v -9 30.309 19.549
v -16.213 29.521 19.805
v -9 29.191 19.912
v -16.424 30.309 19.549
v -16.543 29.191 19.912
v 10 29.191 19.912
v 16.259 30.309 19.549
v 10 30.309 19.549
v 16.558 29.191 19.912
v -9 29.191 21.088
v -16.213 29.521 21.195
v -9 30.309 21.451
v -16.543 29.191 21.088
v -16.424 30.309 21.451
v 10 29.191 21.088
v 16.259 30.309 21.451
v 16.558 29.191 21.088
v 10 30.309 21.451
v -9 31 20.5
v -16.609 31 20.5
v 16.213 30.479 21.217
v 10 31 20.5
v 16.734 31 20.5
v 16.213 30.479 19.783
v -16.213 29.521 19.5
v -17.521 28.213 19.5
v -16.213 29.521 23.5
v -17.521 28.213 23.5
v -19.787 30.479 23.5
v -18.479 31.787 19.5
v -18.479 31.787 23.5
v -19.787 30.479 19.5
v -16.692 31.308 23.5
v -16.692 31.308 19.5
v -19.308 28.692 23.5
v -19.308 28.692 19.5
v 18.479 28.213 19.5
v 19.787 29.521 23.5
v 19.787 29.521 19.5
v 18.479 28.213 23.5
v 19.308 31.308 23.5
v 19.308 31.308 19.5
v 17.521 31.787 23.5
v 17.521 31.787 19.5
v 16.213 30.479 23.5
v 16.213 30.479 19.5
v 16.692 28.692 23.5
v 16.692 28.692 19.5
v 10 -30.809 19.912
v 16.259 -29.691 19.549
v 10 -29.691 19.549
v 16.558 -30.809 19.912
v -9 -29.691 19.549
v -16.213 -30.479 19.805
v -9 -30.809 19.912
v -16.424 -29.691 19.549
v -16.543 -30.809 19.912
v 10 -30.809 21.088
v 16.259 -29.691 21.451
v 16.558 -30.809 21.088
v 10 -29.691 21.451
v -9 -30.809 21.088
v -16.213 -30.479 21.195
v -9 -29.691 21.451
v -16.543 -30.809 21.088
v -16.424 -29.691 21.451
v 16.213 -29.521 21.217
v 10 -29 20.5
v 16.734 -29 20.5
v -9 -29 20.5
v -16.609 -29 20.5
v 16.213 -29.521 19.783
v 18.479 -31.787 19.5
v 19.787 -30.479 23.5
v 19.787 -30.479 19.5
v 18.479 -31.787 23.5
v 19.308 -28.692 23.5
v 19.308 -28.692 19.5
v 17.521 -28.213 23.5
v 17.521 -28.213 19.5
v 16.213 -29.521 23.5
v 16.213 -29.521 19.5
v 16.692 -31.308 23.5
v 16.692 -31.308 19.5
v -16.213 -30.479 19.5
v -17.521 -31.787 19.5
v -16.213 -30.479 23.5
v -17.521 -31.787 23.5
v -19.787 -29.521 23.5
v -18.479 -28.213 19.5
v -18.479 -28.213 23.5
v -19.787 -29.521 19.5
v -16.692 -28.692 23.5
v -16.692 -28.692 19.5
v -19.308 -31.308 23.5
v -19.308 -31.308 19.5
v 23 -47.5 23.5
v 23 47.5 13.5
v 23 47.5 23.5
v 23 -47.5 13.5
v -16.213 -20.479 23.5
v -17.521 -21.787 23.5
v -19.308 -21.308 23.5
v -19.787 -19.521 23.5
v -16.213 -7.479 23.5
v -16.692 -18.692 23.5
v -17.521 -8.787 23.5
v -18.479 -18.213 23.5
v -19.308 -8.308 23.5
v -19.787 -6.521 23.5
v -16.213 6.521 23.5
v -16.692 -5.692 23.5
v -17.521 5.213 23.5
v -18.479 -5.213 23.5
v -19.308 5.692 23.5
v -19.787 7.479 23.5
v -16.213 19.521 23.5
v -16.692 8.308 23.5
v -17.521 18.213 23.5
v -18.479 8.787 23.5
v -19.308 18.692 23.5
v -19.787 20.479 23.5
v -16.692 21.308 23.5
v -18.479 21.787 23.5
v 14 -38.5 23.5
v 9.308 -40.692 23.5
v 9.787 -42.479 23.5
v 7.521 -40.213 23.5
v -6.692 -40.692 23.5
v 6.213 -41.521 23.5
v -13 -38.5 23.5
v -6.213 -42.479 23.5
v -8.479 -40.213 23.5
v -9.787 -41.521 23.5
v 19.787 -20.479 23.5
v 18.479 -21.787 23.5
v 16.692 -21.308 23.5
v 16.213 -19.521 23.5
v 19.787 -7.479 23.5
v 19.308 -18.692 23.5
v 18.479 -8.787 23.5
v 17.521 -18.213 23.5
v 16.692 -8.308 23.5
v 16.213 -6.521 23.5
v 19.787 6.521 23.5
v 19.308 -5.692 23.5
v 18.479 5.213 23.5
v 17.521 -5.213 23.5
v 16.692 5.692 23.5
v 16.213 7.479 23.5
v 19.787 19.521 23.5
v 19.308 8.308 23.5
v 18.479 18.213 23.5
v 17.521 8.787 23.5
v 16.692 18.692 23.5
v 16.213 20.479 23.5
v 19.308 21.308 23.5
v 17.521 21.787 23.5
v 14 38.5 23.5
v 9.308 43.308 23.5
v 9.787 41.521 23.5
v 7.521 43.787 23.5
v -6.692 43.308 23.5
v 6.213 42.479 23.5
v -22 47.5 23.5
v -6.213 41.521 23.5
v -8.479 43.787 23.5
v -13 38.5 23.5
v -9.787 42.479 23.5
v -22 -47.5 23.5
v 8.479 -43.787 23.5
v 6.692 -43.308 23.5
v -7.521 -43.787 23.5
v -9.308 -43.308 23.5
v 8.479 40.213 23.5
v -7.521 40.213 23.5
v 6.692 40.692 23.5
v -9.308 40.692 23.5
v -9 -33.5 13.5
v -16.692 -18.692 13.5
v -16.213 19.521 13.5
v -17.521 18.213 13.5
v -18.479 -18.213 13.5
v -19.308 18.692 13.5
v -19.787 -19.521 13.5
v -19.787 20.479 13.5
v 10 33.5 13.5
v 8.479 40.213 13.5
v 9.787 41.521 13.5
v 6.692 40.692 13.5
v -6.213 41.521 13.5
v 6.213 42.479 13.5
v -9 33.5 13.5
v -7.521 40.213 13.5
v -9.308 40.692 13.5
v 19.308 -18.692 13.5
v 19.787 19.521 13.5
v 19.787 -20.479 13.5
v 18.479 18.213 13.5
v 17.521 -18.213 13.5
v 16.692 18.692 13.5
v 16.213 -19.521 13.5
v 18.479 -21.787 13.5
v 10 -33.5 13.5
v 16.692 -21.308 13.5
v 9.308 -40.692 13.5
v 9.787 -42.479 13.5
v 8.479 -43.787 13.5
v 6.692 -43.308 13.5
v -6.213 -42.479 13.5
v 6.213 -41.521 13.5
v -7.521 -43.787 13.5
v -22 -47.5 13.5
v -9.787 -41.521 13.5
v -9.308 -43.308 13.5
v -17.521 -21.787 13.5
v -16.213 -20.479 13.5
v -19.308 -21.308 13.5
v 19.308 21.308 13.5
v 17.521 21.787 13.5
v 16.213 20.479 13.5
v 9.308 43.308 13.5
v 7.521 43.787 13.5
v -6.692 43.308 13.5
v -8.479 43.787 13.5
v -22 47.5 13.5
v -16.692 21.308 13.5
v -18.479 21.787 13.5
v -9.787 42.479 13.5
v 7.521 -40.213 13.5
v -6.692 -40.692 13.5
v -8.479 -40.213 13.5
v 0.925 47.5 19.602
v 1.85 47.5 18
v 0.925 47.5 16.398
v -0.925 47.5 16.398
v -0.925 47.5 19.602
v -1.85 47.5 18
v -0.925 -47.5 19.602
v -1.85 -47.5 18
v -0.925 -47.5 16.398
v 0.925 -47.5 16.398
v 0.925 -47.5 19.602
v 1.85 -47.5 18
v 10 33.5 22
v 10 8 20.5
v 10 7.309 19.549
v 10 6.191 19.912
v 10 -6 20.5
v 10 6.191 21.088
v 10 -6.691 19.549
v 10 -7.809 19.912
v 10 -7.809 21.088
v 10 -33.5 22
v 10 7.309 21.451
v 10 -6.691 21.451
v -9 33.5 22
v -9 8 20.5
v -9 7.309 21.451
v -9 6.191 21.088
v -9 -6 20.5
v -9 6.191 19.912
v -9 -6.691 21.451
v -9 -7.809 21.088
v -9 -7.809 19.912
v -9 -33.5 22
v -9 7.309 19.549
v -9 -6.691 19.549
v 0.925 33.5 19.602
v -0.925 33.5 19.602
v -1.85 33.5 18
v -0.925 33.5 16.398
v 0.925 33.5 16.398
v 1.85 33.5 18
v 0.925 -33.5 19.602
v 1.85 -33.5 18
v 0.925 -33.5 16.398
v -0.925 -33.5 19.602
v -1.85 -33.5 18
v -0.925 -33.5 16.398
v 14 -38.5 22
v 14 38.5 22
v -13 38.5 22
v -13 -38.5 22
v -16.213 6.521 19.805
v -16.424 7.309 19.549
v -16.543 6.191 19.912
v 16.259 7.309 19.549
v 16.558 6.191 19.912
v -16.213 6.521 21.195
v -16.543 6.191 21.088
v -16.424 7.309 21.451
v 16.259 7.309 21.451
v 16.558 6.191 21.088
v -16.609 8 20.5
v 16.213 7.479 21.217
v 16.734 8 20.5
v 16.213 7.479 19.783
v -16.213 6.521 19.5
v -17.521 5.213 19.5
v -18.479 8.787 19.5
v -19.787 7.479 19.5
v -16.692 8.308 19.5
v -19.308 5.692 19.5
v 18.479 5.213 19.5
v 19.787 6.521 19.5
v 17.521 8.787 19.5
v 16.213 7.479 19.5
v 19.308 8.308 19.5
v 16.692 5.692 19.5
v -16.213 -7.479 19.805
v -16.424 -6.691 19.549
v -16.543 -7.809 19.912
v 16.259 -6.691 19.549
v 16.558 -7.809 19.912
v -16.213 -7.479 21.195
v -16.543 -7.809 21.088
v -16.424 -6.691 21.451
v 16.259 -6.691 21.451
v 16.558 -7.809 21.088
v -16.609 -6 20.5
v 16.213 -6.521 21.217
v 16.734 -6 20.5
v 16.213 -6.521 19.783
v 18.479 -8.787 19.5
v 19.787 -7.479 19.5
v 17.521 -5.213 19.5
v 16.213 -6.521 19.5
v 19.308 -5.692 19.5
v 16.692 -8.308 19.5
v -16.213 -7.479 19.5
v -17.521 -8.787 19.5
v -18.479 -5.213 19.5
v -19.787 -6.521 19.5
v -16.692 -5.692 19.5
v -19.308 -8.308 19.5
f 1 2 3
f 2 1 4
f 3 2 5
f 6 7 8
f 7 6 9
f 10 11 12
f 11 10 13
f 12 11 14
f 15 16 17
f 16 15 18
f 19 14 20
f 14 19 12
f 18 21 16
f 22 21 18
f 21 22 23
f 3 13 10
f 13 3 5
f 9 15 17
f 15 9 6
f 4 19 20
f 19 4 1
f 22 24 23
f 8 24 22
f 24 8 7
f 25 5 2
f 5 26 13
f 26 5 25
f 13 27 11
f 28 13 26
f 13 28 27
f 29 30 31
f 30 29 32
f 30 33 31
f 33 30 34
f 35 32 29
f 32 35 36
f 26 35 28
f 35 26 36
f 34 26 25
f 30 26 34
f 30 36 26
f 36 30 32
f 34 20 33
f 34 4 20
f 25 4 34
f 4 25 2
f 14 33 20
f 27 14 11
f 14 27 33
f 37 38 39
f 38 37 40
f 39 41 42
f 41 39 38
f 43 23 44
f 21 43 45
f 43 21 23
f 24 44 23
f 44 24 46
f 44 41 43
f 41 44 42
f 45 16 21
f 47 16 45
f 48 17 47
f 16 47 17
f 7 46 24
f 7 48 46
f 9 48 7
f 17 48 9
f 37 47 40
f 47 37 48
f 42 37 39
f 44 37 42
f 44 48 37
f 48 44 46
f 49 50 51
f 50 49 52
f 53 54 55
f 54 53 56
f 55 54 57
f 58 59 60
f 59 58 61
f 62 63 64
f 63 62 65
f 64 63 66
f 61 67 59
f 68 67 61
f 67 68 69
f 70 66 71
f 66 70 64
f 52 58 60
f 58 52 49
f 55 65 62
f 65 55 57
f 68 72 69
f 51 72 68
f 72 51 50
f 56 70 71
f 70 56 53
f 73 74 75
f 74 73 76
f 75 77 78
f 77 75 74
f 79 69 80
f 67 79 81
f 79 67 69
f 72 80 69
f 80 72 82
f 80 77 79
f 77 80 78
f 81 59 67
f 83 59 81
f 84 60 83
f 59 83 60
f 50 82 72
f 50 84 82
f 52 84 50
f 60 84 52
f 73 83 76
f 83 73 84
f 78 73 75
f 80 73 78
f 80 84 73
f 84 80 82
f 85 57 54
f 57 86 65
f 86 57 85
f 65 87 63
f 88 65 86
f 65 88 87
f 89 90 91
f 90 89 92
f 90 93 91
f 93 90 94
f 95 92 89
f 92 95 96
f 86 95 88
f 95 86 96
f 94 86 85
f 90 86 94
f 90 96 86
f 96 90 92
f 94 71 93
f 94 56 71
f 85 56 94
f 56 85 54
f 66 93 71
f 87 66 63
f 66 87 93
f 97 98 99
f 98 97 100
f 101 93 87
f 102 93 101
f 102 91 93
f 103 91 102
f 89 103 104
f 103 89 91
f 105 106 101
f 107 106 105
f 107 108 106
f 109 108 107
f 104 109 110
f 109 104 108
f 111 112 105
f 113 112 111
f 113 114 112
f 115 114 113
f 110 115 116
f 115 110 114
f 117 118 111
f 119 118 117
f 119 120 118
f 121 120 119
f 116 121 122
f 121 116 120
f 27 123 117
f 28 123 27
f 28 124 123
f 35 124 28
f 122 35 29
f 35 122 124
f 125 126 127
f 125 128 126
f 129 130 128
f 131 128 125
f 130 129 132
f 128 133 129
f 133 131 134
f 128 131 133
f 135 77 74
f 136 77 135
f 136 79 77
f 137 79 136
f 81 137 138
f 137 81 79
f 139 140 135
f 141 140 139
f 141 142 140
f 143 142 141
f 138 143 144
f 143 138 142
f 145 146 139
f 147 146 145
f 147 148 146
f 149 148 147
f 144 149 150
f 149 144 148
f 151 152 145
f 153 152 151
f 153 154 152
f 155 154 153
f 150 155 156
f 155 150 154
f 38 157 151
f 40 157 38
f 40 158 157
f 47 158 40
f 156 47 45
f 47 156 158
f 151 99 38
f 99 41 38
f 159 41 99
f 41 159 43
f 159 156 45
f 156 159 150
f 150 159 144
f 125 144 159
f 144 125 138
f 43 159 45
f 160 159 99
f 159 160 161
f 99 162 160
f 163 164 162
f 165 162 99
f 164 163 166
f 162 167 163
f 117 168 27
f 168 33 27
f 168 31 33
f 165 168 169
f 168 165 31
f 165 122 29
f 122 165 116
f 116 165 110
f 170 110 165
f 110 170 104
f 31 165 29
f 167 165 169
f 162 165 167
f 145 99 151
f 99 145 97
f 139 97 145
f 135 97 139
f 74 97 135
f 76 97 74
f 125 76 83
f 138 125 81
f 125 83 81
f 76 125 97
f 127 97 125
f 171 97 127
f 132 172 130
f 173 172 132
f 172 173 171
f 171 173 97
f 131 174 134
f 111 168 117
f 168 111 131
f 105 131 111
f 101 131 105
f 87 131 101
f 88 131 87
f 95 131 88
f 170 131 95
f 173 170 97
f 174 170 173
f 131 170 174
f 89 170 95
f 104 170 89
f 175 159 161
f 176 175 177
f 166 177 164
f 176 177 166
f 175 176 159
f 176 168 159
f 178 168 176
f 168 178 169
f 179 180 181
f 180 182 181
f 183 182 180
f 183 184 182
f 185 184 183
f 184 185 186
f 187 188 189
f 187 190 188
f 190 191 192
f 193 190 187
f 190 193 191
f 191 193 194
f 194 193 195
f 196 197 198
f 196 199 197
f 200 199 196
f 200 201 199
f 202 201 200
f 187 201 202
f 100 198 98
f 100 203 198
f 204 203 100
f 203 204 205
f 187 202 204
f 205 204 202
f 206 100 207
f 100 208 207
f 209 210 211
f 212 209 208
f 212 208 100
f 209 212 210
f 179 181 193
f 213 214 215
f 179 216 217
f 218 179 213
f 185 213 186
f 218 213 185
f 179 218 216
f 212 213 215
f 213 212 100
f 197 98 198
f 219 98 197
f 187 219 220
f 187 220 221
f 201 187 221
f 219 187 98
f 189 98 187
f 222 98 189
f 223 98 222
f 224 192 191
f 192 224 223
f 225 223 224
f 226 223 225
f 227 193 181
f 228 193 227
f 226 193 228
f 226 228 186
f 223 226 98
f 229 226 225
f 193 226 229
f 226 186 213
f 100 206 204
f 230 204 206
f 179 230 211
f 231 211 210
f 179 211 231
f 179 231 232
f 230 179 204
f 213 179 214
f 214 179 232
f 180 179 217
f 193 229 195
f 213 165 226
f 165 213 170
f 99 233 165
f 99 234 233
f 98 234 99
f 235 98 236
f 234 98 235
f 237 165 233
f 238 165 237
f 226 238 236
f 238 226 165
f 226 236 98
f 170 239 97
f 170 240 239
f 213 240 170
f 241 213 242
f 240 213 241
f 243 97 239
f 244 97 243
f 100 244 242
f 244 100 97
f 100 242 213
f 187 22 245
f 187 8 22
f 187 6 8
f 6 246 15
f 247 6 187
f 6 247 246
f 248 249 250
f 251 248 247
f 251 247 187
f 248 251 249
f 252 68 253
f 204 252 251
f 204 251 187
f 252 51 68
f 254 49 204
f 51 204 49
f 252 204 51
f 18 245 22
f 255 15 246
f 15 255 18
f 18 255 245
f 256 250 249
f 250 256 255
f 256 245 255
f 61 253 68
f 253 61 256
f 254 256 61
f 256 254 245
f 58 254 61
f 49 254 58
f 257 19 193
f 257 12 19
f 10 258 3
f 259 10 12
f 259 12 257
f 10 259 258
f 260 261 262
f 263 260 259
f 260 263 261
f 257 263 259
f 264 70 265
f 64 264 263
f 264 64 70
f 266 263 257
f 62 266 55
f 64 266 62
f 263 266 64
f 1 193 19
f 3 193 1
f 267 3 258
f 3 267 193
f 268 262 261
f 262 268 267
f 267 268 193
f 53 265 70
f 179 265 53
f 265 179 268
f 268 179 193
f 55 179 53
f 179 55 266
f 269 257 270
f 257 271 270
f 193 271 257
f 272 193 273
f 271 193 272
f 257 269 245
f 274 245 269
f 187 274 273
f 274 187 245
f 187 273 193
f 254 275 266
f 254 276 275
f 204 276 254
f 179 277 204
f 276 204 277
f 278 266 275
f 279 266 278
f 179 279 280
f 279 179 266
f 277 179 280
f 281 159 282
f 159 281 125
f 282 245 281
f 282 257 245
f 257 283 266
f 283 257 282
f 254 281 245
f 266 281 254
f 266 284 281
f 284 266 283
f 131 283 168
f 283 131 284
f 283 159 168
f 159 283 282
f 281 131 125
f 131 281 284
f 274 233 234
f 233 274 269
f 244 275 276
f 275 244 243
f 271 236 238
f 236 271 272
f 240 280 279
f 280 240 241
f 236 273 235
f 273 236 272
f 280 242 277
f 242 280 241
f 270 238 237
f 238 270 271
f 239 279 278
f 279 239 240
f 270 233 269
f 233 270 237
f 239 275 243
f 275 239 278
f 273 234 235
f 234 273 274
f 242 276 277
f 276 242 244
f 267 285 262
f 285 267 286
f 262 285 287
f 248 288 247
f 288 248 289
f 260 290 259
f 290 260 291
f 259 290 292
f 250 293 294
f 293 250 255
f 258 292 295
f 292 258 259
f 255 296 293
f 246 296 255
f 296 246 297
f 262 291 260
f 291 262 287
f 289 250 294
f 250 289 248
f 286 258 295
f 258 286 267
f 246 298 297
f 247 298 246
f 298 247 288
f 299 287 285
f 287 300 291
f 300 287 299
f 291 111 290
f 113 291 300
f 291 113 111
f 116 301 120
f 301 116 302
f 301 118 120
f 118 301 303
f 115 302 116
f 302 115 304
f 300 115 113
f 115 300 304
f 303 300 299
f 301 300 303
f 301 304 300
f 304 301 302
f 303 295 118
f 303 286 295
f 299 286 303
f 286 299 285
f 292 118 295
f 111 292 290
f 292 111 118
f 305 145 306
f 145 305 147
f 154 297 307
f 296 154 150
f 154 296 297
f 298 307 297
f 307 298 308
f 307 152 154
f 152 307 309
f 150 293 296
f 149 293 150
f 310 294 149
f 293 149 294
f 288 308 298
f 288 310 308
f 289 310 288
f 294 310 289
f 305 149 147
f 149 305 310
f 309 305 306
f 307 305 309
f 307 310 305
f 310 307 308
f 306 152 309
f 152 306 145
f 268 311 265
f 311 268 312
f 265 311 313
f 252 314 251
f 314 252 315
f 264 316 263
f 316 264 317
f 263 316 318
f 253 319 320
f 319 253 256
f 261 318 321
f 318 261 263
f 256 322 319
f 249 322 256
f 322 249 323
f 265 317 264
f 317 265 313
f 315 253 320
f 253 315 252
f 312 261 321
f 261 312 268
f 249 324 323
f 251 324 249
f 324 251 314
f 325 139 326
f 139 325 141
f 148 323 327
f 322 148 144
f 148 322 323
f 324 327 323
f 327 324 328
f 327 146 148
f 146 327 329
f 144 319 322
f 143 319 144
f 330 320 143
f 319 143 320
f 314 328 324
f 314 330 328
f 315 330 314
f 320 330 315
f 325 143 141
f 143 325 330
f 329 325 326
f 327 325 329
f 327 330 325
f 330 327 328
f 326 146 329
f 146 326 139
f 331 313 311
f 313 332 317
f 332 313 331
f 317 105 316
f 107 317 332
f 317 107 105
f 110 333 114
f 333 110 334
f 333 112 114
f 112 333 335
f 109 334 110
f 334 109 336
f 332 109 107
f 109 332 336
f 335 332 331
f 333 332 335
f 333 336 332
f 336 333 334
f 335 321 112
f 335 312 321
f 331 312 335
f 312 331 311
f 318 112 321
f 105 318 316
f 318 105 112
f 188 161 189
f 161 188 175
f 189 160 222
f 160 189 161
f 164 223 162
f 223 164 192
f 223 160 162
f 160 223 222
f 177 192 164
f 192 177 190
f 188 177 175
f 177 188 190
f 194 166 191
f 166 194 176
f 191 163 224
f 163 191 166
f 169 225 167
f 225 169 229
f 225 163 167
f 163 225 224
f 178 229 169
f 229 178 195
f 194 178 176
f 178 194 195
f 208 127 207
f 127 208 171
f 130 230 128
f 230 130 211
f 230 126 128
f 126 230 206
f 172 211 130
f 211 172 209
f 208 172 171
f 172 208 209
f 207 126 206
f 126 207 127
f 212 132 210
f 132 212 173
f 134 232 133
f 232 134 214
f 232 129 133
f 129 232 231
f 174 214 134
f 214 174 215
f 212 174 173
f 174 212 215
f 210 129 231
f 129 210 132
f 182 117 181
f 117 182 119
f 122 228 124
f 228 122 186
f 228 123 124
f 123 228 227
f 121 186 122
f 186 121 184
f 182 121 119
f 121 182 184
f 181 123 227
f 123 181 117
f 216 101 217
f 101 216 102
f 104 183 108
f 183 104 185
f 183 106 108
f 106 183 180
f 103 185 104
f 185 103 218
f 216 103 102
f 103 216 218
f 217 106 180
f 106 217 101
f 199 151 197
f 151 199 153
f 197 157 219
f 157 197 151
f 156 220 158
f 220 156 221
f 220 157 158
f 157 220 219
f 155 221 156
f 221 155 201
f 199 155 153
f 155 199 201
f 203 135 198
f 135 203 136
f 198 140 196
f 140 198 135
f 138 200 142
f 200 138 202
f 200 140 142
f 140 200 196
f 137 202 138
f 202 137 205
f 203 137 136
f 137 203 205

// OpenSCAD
//translate([0,0,0.1])phillip_lowergasket();
//translate([0,0,12.1])phillip_middlegasket();
//translate([0,0,12.1+11])phillip_topgasket();

translate([0,0,13.5])color("pink")phillip_lid();
/*
phillip_base();
translate([0,0,0.1])phillip_lowergasket();
translate([-12,-37.5,11])color("lightblue")cube([25,75,1]);
translate([0,0,12.1])phillip_middlegasket();

translate([-12,-37.5,11+11])color("lightblue")cube([25,75,1]);
translate([0,0,12.1+11])phillip_topgasket();

translate([0,0,22+2.5])color("lime")phillip_window();
*/
/*
phillip_magnetholder();
translate([-5,-37.5+7,3.5])color("silver")cube([10,60,5]);
*/


module phillip_magnetholder(){

difference(){
 translate([-5-3,-37.5+7-2,0])cube([10+6,60+4,7]);
 translate([-5-0.5,-37.5+7-0.5,4])cube([10+1,60+1,5]);
 translate([-5-0.5+5,-37.5+7-0.5+10,-3])cylinder(r=3.7/2,h=30);
 translate([-5-0.5+5,-37.5+7-0.5+10,1])cylinder(r=8/2,h=3);
 translate([-5-0.5+5,-37.5+7-0.5+10+40,-3])cylinder(r=3.7/2,h=30);
 translate([-5-0.5+5,-37.5+7-0.5+10+40,1])cylinder(r=8/2,h=3);
 
}
}

module phillip_window(){
difference(){
union(){
translate([-12-10,-37.5-10,0])cube([25+20,75+20,8]);
}
translate([-12+4,-37.5-10+14,-0.1])cube([25-8,75-8,50]);
//translate([-12-2,-37.5-10+14+5,-0.1])cube([25+4,75-18,50]);
translate([-12-1,-37.5-1,10-1.5])cube([27,77,1.6+10]);
/*
translate([-12,60,5])rotate([90,0,0])cylinder(r=(3.7)/2,h=150);
translate([0,60,5-2.5])rotate([90,0,0])cylinder(r=(3.7)/2,h=150);
translate([12,60,5])rotate([90,0,0])cylinder(r=(3.7)/2,h=150);
for(i=[0:6]){
translate([-12-8,60-30-(i*10),5])rotate([90,0,90])cylinder(r=(2.3)/2,h=42);
}
*/



translate([-18,7,-7])rotate([0,0,45])cylinder(r=(3.7)/2,h=25);
translate([18,7,-7])rotate([0,0,45])cylinder(r=(3.7)/2,h=25);
translate([0,23,0]){
translate([-18,7,-7])rotate([0,0,45])cylinder(r=(3.7)/2,h=25);
translate([18,7,-7])rotate([0,0,45])cylinder(r=(3.7)/2,h=25);
}
translate([18,-7,-7])rotate([0,0,45])cylinder(r=(3.7)/2,h=25);
translate([-18,-7,7])rotate([0,0,45])cylinder(r=(3.7)/2,h=25);
translate([0,-23,0]){
translate([18,-7,-7])rotate([0,0,45])cylinder(r=(3.7)/2,h=25);
translate([-18,-7,-7])rotate([0,0,45])cylinder(r=(3.7)/2,h=25);
}










translate([18-10,42,-10])rotate([0,0,45])cylinder(r=(3.7)/2,h=25);
translate([18-10,42,0+4.5])rotate([0,0,45])cylinder(r=(8)/2,h=4);

translate([18,20,-10])rotate([0,0,45])cylinder(r=(3.7)/2,h=25);
translate([18,20,0+4.5])rotate([0,0,45])cylinder(r=(8)/2,h=4);

translate([18,-20,-10])rotate([0,0,45])cylinder(r=(3.7)/2,h=25);
translate([18,-20,0+4.5])rotate([0,0,45])cylinder(r=(8)/2,h=4);

//translate([18,0,-10])rotate([0,0,45])cylinder(r=(3.7)/2,h=25);
//translate([18,0,0+4.5])rotate([0,0,45])cylinder(r=(8)/2,h=4);

translate([-18,-20,-10])rotate([0,0,45])cylinder(r=(3.7)/2,h=25);
translate([-18,-20,4.5])rotate([0,0,45])cylinder(r=(8)/2,h=4);

translate([-18,20,-10])rotate([0,0,45])cylinder(r=(3.7)/2,h=25);
translate([-18,20,4.5])rotate([0,0,45])cylinder(r=(8)/2,h=4);


translate([-18,7,-10])rotate([0,0,45])cylinder(r=(3.7)/2,h=25);
translate([-18,-7,-10])rotate([0,0,45])cylinder(r=(3.7)/2,h=25);
translate([18,7,-10])rotate([0,0,45])cylinder(r=(3.7)/2,h=25);
translate([18,-7,-10])rotate([0,0,45])cylinder(r=(3.7)/2,h=25);




translate([-18+10,42,-10])rotate([0,0,45])cylinder(r=(3.7)/2,h=25);
translate([-18+10,42,4.5])rotate([0,0,45])cylinder(r=(8)/2,h=4);


translate([18-10,-42,-10])rotate([0,0,45])cylinder(r=(3.7)/2,h=25);
translate([18-10,-42,4.5])rotate([0,0,45])cylinder(r=(8)/2,h=4);
translate([-18+10,-42,-10])rotate([0,0,45])cylinder(r=(3.7)/2,h=25);
translate([-18+10,-42,4.5])rotate([0,0,45])cylinder(r=(8)/2,h=4);
}
}
/*
*/




module phillip_lid(){
difference(){
union(){
translate([-12-10,-37.5-10,0])cube([25+20,75+20,10]);
}
translate([-12+3,-37.5-10+14,-0.1])cube([25-6,75-8,50]);
//translate([-12-2,-37.5-10+14+5,-0.1])cube([25+4,75-18,50]);
translate([-12-1,-37.5-1,10-1.5])cube([27,77,1.6+10]);
//translate([-12,60,5])rotate([90,0,0])cylinder(r=(3.7)/2,h=150);
translate([0,60,5-2.5+2])rotate([90,0,0])#cylinder(r=(3.7)/2,h=150);
//translate([12,60,5])rotate([90,0,0])cylinder(r=(3.7)/2,h=150);

/*
for(i=[0:6]){
translate([-12-8,60-30-(i*10),5])rotate([90,0,90])cylinder(r=(2.3)/2,h=42);
}
*/
translate([-18,7,7])rotate([90,0,90])cylinder(r=(2)/2,h=35);
translate([-18,7,6])rotate([0,0,45])cylinder(r=(3.7)/2,h=25);
translate([18,7,6])rotate([0,0,45])cylinder(r=(3.7)/2,h=25);
translate([0,23,0]){
translate([-18,7,7])rotate([90,0,90])cylinder(r=(2)/2,h=35);
translate([-18,7,6])rotate([0,0,45])cylinder(r=(3.7)/2,h=25);
translate([18,7,6])rotate([0,0,45])cylinder(r=(3.7)/2,h=25);
}



translate([-18,-7,7])rotate([90,0,90])cylinder(r=(2)/2,h=35);
translate([18,-7,6])rotate([0,0,45])cylinder(r=(3.7)/2,h=25);
translate([-18,-7,6])rotate([0,0,45])cylinder(r=(3.7)/2,h=25);
translate([0,-23,0]){
translate([-18,-7,7])rotate([90,0,90])cylinder(r=(2)/2,h=35);
translate([18,-7,6])rotate([0,0,45])cylinder(r=(3.7)/2,h=25);
translate([-18,-7,6])rotate([0,0,45])cylinder(r=(3.7)/2,h=25);
}




translate([18-10,42,-10])rotate([0,0,45])cylinder(r=(3.7)/2,h=25);
translate([-18+10,42,-10])rotate([0,0,45])cylinder(r=(3.7)/2,h=25);
translate([18-10,-42,-10])rotate([0,0,45])cylinder(r=(3.7)/2,h=25);
translate([-18+10,-42,-10])rotate([0,0,45])cylinder(r=(3.7)/2,h=25);
translate([-18,20,-10])rotate([0,0,45])cylinder(r=(3.7)/2,h=25);
translate([-18,-20,-10])rotate([0,0,45])cylinder(r=(3.7)/2,h=25);
translate([18,20,-10])rotate([0,0,45])cylinder(r=(3.7)/2,h=25);
translate([18,-20,-10])rotate([0,0,45])cylinder(r=(3.7)/2,h=25);


translate([18-10,42,-10])rotate([0,0,45])cylinder(r=(3.7)/2,h=25);
translate([-18+10,42,-10])rotate([0,0,45])cylinder(r=(3.7)/2,h=25);
translate([18-10,-42,-10])rotate([0,0,45])cylinder(r=(3.7)/2,h=25);
translate([-18+10,-42,-10])rotate([0,0,45])cylinder(r=(3.7)/2,h=25);
translate([-18,20,-10])rotate([0,0,45])cylinder(r=(3.7)/2,h=25);
translate([-18,-20,-10])rotate([0,0,45])cylinder(r=(3.7)/2,h=25);
translate([18,20,-10])rotate([0,0,45])cylinder(r=(3.7)/2,h=25);
translate([18,-20,-10])rotate([0,0,45])cylinder(r=(3.7)/2,h=25);


}
}

module phillip_lowergasket(){
difference(){
translate([-12-1+0.5,-37.5-1+0.5,10-1.5+2-1.5])color("red")cube([27-1,77-1,1.5]);
translate([-12+3.5,-37.5-10+14+0.5,-0.1])cube([25-7,75-9,50]);
}
}


module phillip_middlegasket(){
difference(){
translate([-12-10,-37.5-10,0])color("red")cube([25+20,75+20,1.5-1]);
translate([-12-1,-37.5-1,-0.2])cube([27,77,10]);

translate([18-10,42,-10])rotate([0,0,45])cylinder(r=(3.7)/2,h=25);
translate([-18+10,42,-10])rotate([0,0,45])cylinder(r=(3.7)/2,h=25);
translate([18-10,-42,-10])rotate([0,0,45])cylinder(r=(3.7)/2,h=25);
translate([-18+10,-42,-10])rotate([0,0,45])cylinder(r=(3.7)/2,h=25);
translate([-18,20,-10])rotate([0,0,45])cylinder(r=(3.7)/2,h=25);
translate([-18,-20,-10])rotate([0,0,45])cylinder(r=(3.7)/2,h=25);
translate([18,20,-10])rotate([0,0,45])cylinder(r=(3.7)/2,h=25);
translate([18,-20,-10])rotate([0,0,45])cylinder(r=(3.7)/2,h=25);
}
}

module phillip_topgasket(){
difference(){
translate([-12-10,-37.5-10,0])color("red")cube([25+20,75+20,1.5-1]);
translate([-12-1,-37.5-1,-0.2])cube([27,77,10]);
translate([-18,7,-0.6])rotate([0,0,45])cylinder(r=(3.7)/2,h=25);
translate([18,7,-0.6])rotate([0,0,45])cylinder(r=(3.7)/2,h=25);
translate([0,23,-0.6]){
translate([-18,7,-0.6])rotate([0,0,45])cylinder(r=(3.7)/2,h=25);
translate([18,7,-0.6])rotate([0,0,45])cylinder(r=(3.7)/2,h=25);
}
translate([18,-7,-0.6])rotate([0,0,45])cylinder(r=(3.7)/2,h=25);
translate([-18,-7,-0.6])rotate([0,0,45])cylinder(r=(3.7)/2,h=25);
translate([0,-23,0]){
translate([18,-7,-0.6])rotate([0,0,45])cylinder(r=(3.7)/2,h=25);
translate([-18,-7,-0.6])rotate([0,0,45])cylinder(r=(3.7)/2,h=25);
}
translate([18-10,42,-10])rotate([0,0,45])cylinder(r=(3.7)/2,h=25);
translate([-18+10,42,-10])rotate([0,0,45])cylinder(r=(3.7)/2,h=25);
translate([18-10,-42,-10])rotate([0,0,45])cylinder(r=(3.7)/2,h=25);
translate([-18+10,-42,-10])rotate([0,0,45])cylinder(r=(3.7)/2,h=25);
translate([-18,20,-10])rotate([0,0,45])cylinder(r=(3.7)/2,h=25);
translate([-18,-20,-10])rotate([0,0,45])cylinder(r=(3.7)/2,h=25);
translate([18,20,-10])rotate([0,0,45])cylinder(r=(3.7)/2,h=25);
translate([18,-20,-10])rotate([0,0,45])cylinder(r=(3.7)/2,h=25);
}
}

















module phillip_base(){
difference(){
union(){
translate([-12-10,-37.5-10,0])cube([25+20,75+20,10+2]);
translate([-12-20,-37.5+4,0])cube([25+40,75-8,4]);
}
//translate([-12-2,-37.5-10+14+5,-0.1])cube([25+4,75-18,50]);
translate([-12+3,-37.5-10+14,-0.1])cube([25-6,75-8,50]);
translate([-12-1,-37.5-1,10-1.5+2-1.5])cube([27,77,1.6+10]);

//translate([-12,60,5])rotate([90,0,0])cylinder(r=(3.7)/2,h=150);
translate([0,60,5])rotate([90,0,0])cylinder(r=(3.7)/2,h=150);
//translate([12,60,5])rotate([90,0,0])cylinder(r=(3.7)/2,h=150);

translate([18,20,-20])rotate([0,0,45])cylinder(r=(2.7)/2,h=100);
translate([18,-20,-20])rotate([0,0,45])cylinder(r=(2.7)/2,h=100);
translate([-18,20,-20])rotate([0,0,45])cylinder(r=(2.7)/2,h=100);
translate([-18,-20,-20])rotate([0,0,45])cylinder(r=(2.7)/2,h=100);


translate([18-10,42,-20])rotate([0,0,45])cylinder(r=(2.7)/2,h=100);
translate([-18+10,42,-20])rotate([0,0,45])cylinder(r=(2.7)/2,h=100);
translate([18-10,-42,-20])rotate([0,0,45])cylinder(r=(2.7)/2,h=100);
translate([-18+10,-42,-20])rotate([0,0,45])cylinder(r=(2.7)/2,h=100);

translate([18+11,0-25,-20])rotate([0,0,45])cylinder(r=(3.7)/2,h=100);
translate([18+11,0+25,-20])rotate([0,0,45])cylinder(r=(3.7)/2,h=100);
translate([-18-11,0-25,-20])rotate([0,0,45])cylinder(r=(3.7)/2,h=100);
translate([-18-11,0+25,-20])rotate([0,0,45])cylinder(r=(3.7)/2,h=100);


}
}
